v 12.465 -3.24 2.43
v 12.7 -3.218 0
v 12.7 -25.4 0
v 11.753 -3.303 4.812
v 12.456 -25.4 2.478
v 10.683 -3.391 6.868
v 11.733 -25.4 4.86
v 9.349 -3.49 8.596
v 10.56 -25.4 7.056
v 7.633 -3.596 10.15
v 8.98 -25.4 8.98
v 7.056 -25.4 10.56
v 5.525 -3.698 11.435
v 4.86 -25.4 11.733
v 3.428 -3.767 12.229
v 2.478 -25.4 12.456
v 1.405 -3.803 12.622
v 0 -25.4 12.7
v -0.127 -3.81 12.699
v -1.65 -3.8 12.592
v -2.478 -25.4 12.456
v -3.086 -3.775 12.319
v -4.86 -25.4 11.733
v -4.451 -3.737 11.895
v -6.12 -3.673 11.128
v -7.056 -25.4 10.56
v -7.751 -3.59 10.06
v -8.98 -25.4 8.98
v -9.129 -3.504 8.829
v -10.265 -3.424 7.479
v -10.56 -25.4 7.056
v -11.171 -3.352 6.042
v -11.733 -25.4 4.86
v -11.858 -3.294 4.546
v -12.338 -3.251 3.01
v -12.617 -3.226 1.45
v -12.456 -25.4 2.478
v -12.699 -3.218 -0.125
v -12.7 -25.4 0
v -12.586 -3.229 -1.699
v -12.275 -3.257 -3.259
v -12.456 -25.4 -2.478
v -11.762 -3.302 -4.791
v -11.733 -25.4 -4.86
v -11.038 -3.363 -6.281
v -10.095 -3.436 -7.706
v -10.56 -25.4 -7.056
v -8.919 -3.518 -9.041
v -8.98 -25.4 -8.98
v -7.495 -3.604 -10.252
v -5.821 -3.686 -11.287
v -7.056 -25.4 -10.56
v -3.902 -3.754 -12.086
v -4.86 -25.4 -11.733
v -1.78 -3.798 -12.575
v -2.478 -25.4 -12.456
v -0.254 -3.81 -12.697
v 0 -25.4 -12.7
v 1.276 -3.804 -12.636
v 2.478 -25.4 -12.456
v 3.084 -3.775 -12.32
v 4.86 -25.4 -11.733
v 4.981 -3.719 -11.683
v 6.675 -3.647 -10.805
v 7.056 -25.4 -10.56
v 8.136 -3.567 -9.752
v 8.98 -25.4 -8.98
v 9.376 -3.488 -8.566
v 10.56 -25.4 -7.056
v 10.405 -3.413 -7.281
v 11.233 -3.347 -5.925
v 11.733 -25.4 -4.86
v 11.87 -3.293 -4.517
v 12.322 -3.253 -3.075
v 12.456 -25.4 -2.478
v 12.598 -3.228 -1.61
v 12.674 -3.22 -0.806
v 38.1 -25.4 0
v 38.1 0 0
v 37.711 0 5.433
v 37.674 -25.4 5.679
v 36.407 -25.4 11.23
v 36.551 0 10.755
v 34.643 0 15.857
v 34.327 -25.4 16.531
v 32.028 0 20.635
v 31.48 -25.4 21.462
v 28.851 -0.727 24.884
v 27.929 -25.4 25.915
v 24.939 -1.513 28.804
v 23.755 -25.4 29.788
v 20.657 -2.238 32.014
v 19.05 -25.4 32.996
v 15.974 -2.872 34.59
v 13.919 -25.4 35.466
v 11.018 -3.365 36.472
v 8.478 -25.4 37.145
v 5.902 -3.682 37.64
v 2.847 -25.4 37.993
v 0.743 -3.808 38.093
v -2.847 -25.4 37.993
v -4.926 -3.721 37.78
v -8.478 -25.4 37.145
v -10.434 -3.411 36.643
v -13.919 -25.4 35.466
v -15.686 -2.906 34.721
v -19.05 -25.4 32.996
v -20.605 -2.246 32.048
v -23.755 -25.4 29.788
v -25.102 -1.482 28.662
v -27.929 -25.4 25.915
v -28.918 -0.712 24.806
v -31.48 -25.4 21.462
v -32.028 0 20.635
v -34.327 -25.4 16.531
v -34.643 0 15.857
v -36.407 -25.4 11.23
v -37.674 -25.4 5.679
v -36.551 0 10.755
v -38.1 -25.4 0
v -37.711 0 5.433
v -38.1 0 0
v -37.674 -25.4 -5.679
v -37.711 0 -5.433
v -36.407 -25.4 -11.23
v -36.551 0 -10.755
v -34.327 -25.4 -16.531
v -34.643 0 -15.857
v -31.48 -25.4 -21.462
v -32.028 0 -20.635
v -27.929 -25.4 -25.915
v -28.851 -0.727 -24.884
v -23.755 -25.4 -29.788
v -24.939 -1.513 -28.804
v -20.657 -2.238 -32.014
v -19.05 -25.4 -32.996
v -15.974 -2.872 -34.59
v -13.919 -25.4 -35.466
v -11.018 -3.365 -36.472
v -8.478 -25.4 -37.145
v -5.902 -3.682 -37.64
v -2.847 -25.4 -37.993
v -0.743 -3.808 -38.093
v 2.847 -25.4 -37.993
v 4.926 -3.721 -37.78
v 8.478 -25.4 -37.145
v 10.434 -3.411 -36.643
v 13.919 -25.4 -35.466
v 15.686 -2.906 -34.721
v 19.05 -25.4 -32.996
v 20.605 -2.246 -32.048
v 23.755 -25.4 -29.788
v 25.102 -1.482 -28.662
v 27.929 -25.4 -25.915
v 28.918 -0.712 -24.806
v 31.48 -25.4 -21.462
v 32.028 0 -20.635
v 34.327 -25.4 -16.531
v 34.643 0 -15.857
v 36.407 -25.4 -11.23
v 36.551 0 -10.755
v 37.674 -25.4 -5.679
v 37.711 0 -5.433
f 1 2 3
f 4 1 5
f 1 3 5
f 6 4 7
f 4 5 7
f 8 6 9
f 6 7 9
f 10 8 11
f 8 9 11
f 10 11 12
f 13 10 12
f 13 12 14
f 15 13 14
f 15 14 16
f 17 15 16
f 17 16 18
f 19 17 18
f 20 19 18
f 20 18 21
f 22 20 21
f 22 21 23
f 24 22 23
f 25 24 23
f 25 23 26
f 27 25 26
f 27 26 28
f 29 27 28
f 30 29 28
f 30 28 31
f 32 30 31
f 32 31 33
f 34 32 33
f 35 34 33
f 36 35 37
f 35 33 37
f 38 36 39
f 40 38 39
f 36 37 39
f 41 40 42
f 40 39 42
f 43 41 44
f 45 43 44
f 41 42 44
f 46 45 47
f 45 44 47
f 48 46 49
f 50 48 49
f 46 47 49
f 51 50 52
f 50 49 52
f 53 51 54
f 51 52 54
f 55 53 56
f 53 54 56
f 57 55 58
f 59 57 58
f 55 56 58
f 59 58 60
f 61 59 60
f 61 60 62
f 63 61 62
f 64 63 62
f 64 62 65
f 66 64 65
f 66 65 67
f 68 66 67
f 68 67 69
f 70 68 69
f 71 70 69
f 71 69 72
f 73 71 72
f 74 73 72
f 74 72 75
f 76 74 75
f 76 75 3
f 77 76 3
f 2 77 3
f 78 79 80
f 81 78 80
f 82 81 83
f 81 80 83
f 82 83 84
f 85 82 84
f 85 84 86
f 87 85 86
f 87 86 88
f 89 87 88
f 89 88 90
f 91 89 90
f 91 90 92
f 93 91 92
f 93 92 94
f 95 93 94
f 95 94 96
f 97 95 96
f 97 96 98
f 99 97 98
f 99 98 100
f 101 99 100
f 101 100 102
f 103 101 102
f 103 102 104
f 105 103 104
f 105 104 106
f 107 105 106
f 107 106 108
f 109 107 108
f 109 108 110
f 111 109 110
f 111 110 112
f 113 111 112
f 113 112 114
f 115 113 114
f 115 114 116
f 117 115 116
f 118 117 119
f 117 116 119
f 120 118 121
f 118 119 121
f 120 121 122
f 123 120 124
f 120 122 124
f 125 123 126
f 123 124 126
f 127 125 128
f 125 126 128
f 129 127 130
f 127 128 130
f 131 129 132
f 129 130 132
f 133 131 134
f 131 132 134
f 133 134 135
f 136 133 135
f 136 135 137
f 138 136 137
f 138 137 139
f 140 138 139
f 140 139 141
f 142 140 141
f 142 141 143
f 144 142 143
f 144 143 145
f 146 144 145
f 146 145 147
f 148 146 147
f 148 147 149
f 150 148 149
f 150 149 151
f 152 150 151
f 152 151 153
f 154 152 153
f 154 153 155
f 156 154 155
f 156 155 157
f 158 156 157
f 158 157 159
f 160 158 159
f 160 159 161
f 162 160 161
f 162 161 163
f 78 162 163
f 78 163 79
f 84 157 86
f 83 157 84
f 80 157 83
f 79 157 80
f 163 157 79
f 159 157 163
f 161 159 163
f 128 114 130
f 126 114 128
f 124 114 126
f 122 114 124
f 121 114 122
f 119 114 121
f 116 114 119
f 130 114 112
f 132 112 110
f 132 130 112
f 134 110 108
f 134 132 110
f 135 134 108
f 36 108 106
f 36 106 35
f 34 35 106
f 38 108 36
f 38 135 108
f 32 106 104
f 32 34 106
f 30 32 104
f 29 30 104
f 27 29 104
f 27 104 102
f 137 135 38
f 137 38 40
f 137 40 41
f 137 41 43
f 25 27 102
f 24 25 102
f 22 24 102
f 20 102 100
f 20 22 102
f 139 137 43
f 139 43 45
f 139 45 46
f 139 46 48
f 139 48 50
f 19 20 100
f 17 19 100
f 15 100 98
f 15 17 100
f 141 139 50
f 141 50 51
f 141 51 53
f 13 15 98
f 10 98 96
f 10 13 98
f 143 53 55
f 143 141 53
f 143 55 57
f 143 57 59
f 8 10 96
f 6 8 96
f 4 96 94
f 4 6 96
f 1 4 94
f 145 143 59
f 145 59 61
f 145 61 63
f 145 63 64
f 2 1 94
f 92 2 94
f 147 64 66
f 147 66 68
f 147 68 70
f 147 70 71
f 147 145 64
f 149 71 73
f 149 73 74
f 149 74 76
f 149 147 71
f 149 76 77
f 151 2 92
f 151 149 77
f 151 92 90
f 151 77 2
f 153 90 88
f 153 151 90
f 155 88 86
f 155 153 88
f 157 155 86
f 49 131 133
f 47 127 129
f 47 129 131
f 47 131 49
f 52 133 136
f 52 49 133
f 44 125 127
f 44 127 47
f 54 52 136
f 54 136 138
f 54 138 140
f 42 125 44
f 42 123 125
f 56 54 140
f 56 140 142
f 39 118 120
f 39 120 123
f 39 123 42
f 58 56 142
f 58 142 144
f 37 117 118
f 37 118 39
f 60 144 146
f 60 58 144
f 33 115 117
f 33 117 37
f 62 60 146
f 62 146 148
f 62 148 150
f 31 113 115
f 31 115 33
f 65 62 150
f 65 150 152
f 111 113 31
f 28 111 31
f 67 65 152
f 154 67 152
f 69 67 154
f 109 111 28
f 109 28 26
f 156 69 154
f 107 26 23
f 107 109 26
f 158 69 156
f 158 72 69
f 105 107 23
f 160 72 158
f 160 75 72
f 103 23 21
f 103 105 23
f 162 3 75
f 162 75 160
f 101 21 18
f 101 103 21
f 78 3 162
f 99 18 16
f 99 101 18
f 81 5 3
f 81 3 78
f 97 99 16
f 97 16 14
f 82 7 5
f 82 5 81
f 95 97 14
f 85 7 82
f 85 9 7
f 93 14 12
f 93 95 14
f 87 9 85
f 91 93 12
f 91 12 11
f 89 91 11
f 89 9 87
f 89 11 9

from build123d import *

# Parameters (mm, degrees)
F0_R          = 38.1
F1_DEPTH      = 25.4
F2_R          = 12.7
F3_DEPTH      = 25.401
F5_DEPTH      = 38.101
F5_DEPTH_BACK = 38.101


with BuildPart() as f1:
    # F0 (on Front) → F1 (new body)
    with BuildSketch(Plane.XZ):
        Circle(F0_R)
    extrude(amount=F1_DEPTH)

    # F2 (on face) → F3 (cut, through all)
    with BuildSketch(Plane.XZ.offset(25.4)):
        Circle(F2_R)
    extrude(amount=-F3_DEPTH, mode=Mode.SUBTRACT)

    # F4 (on Top) → F5 (cut, two sides)
    with BuildSketch(Plane.XY) as f5_sk:
        with BuildLine():
            Line((32.0281813408, 0), (-32.0281813408, 0))
            ThreePointArc((-32.0281813408, 0), (0, -3.81), (32.0281813408, 0))
        make_face()
    extrude(amount=-F5_DEPTH, mode=Mode.SUBTRACT)
    extrude(f5_sk.sketch, amount=F5_DEPTH_BACK, mode=Mode.SUBTRACT)


solid = f1.part
